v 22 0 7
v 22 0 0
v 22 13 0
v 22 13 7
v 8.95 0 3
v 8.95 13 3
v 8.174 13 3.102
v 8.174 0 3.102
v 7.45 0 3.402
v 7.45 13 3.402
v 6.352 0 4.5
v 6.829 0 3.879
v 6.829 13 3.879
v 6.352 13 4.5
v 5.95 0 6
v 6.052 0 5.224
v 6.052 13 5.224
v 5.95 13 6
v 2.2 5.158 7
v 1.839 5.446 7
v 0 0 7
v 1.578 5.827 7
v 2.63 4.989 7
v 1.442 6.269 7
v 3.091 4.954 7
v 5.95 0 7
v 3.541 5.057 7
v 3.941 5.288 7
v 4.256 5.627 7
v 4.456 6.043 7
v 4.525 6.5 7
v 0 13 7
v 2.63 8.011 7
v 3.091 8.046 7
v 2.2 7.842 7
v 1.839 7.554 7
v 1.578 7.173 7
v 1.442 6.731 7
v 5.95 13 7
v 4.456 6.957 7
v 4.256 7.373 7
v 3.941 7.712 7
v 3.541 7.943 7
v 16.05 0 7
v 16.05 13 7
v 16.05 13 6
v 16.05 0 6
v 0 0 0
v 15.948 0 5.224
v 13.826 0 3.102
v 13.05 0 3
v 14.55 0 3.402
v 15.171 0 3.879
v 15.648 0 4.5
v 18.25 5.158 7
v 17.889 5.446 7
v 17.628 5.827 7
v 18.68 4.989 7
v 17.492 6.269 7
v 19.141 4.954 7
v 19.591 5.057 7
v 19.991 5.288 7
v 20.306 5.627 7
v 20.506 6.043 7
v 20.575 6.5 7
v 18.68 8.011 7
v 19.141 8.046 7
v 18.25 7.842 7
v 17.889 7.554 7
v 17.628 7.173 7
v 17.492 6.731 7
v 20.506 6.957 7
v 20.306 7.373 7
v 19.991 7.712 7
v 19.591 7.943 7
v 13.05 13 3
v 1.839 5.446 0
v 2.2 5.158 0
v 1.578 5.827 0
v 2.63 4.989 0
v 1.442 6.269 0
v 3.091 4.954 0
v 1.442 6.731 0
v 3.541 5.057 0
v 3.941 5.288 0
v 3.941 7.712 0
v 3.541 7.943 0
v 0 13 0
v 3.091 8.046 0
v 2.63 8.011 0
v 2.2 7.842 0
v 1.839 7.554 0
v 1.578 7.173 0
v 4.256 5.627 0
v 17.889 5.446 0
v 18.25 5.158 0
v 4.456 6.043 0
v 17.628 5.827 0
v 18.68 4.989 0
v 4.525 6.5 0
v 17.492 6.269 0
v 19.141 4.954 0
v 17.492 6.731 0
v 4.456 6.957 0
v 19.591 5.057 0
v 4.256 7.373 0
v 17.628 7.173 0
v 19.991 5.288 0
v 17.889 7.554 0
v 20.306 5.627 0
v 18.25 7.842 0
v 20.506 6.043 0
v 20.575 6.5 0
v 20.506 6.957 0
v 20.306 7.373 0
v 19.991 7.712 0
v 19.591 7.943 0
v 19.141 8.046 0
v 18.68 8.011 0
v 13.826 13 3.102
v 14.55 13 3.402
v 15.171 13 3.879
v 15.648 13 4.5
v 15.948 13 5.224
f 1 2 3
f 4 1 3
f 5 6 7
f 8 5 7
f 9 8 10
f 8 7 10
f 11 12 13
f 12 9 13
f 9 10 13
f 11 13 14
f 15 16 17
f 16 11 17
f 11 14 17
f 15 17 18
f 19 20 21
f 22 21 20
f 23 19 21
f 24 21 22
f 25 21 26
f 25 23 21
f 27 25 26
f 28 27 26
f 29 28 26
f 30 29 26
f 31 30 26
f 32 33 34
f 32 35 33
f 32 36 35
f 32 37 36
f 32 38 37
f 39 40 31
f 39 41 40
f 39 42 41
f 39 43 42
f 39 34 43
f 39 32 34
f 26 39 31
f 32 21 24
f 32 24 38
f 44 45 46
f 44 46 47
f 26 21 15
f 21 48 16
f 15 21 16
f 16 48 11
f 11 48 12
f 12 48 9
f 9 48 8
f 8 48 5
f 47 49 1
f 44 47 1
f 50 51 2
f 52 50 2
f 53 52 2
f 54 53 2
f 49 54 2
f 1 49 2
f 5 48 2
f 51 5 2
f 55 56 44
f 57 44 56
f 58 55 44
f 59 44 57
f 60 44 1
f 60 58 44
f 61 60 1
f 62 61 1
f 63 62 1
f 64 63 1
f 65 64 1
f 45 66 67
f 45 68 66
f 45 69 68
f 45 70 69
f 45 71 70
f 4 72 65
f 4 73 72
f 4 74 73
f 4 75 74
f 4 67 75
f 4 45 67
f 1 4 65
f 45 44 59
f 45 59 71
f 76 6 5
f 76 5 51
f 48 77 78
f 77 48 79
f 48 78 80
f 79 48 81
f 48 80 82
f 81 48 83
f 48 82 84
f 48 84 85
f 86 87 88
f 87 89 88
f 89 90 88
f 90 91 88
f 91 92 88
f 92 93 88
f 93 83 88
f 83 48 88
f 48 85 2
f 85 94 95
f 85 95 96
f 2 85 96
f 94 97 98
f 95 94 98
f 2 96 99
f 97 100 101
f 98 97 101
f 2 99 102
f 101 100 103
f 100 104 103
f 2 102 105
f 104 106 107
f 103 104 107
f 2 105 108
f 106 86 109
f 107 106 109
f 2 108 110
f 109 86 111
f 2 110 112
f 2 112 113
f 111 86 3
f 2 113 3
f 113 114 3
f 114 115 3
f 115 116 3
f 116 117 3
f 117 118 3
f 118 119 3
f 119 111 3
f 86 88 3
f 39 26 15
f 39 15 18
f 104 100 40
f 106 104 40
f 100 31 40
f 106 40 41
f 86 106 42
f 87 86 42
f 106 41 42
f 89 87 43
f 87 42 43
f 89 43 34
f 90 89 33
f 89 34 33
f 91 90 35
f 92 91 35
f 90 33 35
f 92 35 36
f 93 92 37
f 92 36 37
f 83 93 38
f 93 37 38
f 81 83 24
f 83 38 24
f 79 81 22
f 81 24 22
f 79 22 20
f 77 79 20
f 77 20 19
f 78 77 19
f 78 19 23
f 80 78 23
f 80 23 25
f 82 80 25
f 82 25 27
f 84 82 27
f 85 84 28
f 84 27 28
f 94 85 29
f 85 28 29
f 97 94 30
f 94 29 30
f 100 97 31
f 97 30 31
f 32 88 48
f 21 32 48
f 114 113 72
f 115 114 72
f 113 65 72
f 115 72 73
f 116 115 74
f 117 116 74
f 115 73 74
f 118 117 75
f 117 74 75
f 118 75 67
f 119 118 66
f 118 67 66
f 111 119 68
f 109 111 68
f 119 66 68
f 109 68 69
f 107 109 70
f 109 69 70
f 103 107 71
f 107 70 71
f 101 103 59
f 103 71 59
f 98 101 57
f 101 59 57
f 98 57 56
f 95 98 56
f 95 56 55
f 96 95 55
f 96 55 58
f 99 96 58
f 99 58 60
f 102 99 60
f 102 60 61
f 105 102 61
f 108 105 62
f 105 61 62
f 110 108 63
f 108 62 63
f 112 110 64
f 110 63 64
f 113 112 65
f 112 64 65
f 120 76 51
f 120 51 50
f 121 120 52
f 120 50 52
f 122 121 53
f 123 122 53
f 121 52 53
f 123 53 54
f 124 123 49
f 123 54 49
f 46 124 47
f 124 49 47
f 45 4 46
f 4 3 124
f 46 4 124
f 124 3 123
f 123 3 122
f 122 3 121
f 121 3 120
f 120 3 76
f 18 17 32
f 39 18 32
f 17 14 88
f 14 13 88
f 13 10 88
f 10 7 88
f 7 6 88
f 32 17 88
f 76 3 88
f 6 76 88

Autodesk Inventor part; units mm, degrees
ref_plane "YZ Plane" through (0, 0, 0) normal (1, 0, 0) x (0, 1, 0)
ref_plane "XZ Plane" through (0, 0, 0) normal (0, 1, 0) x (-1, 0, 0)
ref_plane "XY Plane" through (0, 0, 0) normal (0, 0, 1) x (1, 0, 0)
sketch "Szkic1" plane through (0, 0, 0) normal (0, 0, 1) x (1, 0, 0)
  line L0 (0, 0) -> (22, 0)
  line L1 (22, 0) -> (22, 13)
  line L2 (22, 13) -> (0, 13)
  line L3 (0, 13) -> (0, 0)
  dimension "d0" = 13
  dimension "d1" = 22
extrude "Wyciągnięcie proste1" add sketch "Szkic1" along normal blind 7
sketch "Szkic2" plane through (0, 0, 7) normal (0, 0, 1) x (1, 0, 0)
  line L0 (22, 0) -> (22, 13) construction
  line L1 (0, 13) -> (0, 0) construction
  line L2 (22, 0) -> (16.05, 0) construction
  line L3 (16.05, 0) -> (16.05, 13) construction
  line L4 (16.05, 13) -> (22, 13) construction
  line L5 (22, 13) -> (22, 0) construction
  line L6 (0, 0) -> (22, 0) construction
  line L7 (0, 0) -> (5.95, 0) construction
  line L8 (5.95, 0) -> (5.95, 13) construction
  line L9 (5.95, 13) -> (0, 13) construction
  line L10 (0, 13) -> (0, 0) construction
  line L11 (16.05, 0) -> (5.95, 0)
  line L12 (5.95, 0) -> (5.95, 13)
  line L13 (5.95, 13) -> (16.05, 13)
  line L14 (16.05, 13) -> (16.05, 0)
  dimension "d4" = 5.95
  dimension "d5" = 5.95
extrude "Wyciągnięcie proste2" cut sketch "Szkic2" against normal blind 4
fillet "Zaokrąglenie1" radius 3 2 edges at (16.05, 6.5, 3) (5.95, 6.5, 3)
sketch "Szkic3" plane through (0, 0, 7) normal (0, 0, 1) x (1, 0, 0)
  line L0 (0, 0) -> (22, 0) construction
  line L1 (0, 0) -> (0, 6.5) construction
  line L2 (0, 13) -> (0, 0) construction
  line L3 (0, 6.5) -> (22, 6.5) construction
  line L4 (22, 0) -> (22, 13) construction
  line L5 (0, 6.5) -> (2.975, 6.5) construction
  line L6 (22, 6.5) -> (19.025, 6.5) construction
  circle A0 centre (2.975, 6.5) radius 1.55
  circle A1 centre (19.025, 6.5) radius 1.55
  dimension "d9" = 2.975
  dimension "d10" = 2.975
  dimension "d11" = 3.1
  dimension "d12" = 3.1
extrude "Wyciągnięcie proste3" cut sketch "Szkic3" against normal blind 7
equation "\"d12\" = d11"
properties part number "Uchwyt_na_silnik"
